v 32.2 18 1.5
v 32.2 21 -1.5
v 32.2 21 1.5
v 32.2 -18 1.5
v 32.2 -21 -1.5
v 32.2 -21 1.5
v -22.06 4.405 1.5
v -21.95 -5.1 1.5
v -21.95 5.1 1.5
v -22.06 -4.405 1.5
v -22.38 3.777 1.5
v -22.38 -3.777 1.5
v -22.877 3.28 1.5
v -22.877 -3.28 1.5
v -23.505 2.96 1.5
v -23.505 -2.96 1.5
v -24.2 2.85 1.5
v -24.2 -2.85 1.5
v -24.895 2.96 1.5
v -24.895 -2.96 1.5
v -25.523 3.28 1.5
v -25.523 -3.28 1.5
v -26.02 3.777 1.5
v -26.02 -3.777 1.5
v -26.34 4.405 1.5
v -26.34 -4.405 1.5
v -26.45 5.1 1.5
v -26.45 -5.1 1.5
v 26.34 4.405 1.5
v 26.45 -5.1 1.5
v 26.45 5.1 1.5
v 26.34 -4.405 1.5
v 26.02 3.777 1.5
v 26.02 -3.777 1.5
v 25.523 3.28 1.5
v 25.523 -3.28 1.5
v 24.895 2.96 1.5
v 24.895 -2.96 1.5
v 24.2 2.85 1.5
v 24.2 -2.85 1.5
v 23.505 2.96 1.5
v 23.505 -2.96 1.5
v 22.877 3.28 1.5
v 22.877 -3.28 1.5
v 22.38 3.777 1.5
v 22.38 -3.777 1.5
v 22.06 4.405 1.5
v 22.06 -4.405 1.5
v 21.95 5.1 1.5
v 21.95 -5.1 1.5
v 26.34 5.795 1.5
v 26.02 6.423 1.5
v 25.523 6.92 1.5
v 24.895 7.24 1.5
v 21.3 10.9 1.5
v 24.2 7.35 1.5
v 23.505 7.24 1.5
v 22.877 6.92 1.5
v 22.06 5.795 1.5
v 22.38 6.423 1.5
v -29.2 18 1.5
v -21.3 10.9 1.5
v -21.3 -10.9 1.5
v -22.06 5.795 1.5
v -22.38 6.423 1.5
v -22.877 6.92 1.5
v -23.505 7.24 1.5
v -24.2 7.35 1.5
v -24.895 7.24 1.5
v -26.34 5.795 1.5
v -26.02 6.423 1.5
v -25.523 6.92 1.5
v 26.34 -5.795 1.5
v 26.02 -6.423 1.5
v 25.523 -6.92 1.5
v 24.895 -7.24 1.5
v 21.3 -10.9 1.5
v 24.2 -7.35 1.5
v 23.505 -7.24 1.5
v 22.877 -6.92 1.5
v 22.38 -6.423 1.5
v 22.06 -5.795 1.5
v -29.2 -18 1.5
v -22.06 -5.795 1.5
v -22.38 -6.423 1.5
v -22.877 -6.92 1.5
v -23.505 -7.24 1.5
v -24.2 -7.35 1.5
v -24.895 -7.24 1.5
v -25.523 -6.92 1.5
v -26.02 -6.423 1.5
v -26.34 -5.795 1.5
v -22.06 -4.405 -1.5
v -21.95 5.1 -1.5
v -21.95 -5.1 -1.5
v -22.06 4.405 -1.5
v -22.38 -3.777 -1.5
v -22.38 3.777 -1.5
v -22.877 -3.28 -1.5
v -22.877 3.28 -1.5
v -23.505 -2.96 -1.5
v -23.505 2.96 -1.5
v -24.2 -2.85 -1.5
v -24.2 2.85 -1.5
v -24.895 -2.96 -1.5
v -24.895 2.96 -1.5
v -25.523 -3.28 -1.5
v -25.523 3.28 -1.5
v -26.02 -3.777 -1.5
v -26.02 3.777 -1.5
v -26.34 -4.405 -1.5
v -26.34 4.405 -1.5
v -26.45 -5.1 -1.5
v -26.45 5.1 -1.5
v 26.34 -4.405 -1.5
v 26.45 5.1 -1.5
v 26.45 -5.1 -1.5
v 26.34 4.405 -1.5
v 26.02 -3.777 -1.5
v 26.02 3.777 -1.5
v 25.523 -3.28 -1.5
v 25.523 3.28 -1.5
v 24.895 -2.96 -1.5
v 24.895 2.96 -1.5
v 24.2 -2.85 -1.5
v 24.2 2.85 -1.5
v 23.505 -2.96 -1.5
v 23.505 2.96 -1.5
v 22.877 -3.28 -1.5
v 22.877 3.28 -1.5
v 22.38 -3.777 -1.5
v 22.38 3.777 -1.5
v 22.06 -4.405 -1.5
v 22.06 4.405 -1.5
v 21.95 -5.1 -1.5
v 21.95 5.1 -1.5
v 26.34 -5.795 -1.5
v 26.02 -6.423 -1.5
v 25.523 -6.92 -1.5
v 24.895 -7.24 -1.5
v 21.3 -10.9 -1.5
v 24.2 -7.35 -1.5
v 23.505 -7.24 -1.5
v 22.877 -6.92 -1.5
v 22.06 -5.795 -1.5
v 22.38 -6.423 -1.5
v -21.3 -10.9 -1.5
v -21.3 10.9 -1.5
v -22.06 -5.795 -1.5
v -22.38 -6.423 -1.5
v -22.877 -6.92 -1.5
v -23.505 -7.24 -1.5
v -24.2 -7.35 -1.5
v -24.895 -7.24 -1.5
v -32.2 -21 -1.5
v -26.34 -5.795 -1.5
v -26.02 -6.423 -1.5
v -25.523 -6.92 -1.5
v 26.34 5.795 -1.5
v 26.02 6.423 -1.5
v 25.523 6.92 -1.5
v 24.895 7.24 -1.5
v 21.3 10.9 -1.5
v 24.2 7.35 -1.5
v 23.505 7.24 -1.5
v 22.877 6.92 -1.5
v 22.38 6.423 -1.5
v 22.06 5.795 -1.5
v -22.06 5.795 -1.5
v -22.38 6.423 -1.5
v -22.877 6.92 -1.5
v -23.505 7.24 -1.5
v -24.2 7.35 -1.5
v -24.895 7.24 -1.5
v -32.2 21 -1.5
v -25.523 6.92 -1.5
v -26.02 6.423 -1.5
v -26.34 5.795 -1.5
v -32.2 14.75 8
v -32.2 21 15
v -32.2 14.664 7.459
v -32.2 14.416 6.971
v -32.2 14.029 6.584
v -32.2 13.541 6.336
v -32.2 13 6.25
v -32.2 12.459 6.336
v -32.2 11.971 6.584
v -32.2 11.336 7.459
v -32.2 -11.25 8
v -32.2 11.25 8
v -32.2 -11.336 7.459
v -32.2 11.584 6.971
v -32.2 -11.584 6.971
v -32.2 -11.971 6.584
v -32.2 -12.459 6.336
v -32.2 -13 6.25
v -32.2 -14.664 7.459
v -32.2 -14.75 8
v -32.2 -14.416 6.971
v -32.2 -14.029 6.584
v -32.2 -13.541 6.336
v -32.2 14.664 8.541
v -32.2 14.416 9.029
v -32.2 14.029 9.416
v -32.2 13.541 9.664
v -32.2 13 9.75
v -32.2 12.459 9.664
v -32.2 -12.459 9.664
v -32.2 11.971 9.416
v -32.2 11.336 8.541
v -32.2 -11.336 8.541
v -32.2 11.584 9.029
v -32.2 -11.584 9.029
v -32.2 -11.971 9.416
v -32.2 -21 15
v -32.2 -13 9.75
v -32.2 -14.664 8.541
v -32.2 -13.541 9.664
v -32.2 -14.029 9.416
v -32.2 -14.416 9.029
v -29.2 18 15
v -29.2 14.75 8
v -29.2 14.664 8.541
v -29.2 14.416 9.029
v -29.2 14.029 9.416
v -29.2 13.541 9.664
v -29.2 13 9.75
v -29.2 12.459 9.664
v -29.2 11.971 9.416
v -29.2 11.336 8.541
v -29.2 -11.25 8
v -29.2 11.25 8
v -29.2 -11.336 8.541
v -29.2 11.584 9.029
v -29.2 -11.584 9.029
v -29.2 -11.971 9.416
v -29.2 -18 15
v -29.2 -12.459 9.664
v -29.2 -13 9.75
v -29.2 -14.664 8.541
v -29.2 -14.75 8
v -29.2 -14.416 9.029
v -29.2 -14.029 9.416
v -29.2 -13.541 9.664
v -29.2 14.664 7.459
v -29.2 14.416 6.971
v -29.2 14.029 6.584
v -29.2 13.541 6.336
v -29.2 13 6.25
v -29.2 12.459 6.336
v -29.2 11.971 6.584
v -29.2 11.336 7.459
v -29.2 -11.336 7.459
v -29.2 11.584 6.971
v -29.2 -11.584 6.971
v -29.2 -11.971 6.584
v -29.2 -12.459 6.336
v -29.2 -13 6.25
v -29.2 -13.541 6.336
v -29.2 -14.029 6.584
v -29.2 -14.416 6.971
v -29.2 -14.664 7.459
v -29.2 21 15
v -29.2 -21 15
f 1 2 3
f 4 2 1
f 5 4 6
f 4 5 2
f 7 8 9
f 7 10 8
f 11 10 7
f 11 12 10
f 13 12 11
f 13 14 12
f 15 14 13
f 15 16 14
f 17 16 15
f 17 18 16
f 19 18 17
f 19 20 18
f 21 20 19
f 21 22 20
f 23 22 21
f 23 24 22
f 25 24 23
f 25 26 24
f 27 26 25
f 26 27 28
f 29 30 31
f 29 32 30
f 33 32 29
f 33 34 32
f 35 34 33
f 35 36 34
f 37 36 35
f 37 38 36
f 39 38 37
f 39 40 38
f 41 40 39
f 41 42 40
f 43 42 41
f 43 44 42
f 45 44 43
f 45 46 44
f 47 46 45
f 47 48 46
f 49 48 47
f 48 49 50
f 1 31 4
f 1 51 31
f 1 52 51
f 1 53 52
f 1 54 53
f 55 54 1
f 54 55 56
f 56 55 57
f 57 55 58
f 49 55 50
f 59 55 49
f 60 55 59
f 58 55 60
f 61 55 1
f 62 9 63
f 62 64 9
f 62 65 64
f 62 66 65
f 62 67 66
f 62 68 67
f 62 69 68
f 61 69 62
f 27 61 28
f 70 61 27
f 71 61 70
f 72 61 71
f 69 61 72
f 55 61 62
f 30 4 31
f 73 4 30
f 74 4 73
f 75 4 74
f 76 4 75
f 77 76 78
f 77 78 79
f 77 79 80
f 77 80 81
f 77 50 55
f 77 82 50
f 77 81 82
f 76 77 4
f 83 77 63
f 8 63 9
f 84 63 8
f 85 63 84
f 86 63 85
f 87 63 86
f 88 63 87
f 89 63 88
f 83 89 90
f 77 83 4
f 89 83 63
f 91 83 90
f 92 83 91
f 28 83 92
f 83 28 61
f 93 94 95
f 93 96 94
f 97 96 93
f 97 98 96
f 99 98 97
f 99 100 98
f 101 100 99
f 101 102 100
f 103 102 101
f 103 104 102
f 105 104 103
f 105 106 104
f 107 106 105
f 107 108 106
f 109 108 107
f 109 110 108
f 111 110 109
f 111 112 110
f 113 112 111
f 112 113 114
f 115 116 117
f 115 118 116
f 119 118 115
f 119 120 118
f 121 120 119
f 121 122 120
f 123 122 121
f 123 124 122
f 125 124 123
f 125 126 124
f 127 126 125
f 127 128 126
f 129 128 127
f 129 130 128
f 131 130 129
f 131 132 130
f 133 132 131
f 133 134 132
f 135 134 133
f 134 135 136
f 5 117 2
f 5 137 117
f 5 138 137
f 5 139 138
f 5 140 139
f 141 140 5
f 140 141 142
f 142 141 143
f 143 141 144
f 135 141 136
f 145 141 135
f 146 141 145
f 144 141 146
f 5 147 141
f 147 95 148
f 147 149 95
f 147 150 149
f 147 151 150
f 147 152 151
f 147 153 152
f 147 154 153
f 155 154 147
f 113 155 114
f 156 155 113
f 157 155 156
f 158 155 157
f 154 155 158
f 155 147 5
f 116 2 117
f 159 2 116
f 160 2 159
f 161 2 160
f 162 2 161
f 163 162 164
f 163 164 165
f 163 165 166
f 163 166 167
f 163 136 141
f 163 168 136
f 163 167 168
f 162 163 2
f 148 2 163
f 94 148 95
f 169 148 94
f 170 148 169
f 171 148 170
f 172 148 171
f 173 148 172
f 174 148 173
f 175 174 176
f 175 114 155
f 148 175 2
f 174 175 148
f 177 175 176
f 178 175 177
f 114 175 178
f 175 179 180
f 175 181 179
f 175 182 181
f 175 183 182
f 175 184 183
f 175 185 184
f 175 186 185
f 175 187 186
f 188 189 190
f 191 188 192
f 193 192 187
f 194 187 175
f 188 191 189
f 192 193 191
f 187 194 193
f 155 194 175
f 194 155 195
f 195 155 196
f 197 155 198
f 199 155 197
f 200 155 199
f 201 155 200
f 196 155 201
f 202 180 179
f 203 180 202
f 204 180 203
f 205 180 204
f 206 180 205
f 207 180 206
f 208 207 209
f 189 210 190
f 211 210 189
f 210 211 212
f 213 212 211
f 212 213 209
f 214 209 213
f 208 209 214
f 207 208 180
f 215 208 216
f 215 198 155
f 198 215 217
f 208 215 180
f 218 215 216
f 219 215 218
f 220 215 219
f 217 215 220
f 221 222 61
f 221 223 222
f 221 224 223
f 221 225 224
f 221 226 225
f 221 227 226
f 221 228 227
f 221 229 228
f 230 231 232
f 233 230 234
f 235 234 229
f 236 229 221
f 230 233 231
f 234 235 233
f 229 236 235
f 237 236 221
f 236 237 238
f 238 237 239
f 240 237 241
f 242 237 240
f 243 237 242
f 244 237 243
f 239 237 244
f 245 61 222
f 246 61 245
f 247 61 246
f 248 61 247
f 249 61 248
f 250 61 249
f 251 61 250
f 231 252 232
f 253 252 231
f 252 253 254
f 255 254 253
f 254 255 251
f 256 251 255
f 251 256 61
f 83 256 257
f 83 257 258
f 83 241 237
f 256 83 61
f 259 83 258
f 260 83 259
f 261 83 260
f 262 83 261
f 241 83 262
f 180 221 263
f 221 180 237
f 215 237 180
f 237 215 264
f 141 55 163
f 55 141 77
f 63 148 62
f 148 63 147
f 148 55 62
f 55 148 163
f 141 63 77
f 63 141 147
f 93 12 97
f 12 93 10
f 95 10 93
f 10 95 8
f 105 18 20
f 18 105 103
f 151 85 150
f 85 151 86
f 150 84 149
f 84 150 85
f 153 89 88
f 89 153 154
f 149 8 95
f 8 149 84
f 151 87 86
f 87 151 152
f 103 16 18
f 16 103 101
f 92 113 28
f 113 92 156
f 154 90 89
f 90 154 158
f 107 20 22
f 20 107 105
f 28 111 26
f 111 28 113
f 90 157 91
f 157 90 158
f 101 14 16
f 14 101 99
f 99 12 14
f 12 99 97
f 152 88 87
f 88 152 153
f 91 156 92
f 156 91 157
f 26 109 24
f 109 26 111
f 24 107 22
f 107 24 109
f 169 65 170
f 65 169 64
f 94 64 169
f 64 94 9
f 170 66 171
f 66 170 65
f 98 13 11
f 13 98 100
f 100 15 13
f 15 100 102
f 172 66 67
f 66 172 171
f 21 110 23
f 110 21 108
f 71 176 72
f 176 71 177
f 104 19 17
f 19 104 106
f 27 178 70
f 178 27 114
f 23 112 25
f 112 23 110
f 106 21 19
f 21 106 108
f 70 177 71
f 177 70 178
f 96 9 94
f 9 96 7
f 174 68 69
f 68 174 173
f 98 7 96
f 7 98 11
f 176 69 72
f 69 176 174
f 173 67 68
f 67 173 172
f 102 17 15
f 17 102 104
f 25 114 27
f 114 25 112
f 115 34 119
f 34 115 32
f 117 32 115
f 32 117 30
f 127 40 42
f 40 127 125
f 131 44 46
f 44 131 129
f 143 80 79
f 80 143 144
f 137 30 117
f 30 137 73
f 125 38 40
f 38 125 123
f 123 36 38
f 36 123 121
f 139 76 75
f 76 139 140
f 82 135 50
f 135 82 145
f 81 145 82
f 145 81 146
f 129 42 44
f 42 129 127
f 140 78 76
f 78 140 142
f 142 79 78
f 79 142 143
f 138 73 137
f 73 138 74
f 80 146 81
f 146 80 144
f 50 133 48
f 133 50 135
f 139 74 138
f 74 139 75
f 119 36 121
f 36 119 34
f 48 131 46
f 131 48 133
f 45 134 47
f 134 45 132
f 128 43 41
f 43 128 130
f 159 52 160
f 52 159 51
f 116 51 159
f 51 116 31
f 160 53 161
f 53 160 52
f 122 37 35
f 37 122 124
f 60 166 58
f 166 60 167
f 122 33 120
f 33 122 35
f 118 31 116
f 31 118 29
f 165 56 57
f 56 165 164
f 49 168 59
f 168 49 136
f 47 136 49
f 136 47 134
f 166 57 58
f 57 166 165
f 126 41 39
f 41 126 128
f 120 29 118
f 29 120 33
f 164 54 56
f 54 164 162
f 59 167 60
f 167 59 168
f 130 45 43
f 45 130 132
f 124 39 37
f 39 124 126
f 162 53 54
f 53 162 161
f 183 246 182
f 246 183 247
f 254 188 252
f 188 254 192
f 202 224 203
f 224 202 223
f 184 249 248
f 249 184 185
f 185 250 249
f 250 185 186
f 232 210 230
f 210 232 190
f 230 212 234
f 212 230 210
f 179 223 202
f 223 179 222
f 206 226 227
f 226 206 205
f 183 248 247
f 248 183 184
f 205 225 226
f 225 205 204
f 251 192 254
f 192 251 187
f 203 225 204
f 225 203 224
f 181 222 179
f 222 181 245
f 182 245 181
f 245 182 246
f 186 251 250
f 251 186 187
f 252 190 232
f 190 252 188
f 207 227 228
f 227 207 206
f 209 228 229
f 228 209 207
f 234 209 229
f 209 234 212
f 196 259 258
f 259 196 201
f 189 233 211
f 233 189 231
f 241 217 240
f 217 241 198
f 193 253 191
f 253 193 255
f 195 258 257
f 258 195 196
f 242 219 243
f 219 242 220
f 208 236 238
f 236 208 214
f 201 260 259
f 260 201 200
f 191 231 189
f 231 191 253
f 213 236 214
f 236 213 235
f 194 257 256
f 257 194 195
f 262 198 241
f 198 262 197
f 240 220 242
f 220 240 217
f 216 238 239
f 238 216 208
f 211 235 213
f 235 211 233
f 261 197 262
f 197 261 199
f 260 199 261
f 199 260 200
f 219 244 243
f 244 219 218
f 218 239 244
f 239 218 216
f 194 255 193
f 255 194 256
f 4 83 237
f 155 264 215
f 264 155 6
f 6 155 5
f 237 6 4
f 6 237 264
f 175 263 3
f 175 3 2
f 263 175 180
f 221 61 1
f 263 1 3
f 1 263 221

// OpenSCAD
diam_M3=3.5;
servo_t=19.8;
servo_w1=40.6;
servo_w2=48.4;
servo_w3=53.4;
servo_d=17.3;
servo_a=20;
servo_fixingscrew_diam=4.5;
servo_fixingscrew_distance=10.2;
thickness=3;
bigger=5;
width=36+thickness;

difference()
{
union(){    
cube([servo_w3+thickness*2+bigger,width,thickness],center=true);
translate([-(servo_w3+thickness*2+bigger)/2,-width/2,0])cube([thickness,width,15]);    
}
cube([servo_w1+2,servo_t+2,thickness*2],center=true);    
//servo screw holes
translate([-servo_w2/2,-servo_fixingscrew_distance/2,0])cylinder(d=servo_fixingscrew_diam,h=100,$fn=20,center=true);
translate([-servo_w2/2,+servo_fixingscrew_distance/2,0])cylinder(d=servo_fixingscrew_diam,h=100,$fn=20,center=true);    
translate([servo_w2/2,-servo_fixingscrew_distance/2,0])cylinder(d=servo_fixingscrew_diam,h=100,$fn=20,center=true);
translate([servo_w2/2,+servo_fixingscrew_distance/2,0])cylinder(d=servo_fixingscrew_diam,h=100,$fn=20,center=true);        
//holes for arm attachment
translate([-(servo_w3+thickness+bigger)/2,8+5,8])rotate([0,90,0]) cylinder(r=diam_M3/2,h=thickness*3,center=true,$fn=20);    
translate([-(servo_w3+thickness+bigger)/2,-8-5,8])rotate([0,90,0]) cylinder(r=diam_M3/2,h=thickness*3,center=true,$fn=20);  
}

translate([0,-width/2,0])hull() {
translate([-(servo_w3+thickness*2+bigger)/2,-thickness/2,0])cube([thickness,thickness,15]); 
cube([servo_w3+thickness*2+bigger,thickness,thickness],center=true);    
}
translate([0,width/2,0])hull() {
translate([-(servo_w3+thickness*2+bigger)/2,-thickness/2,0])cube([thickness,thickness,15]); 
cube([servo_w3+thickness*2+bigger,thickness,thickness],center=true);    
}
